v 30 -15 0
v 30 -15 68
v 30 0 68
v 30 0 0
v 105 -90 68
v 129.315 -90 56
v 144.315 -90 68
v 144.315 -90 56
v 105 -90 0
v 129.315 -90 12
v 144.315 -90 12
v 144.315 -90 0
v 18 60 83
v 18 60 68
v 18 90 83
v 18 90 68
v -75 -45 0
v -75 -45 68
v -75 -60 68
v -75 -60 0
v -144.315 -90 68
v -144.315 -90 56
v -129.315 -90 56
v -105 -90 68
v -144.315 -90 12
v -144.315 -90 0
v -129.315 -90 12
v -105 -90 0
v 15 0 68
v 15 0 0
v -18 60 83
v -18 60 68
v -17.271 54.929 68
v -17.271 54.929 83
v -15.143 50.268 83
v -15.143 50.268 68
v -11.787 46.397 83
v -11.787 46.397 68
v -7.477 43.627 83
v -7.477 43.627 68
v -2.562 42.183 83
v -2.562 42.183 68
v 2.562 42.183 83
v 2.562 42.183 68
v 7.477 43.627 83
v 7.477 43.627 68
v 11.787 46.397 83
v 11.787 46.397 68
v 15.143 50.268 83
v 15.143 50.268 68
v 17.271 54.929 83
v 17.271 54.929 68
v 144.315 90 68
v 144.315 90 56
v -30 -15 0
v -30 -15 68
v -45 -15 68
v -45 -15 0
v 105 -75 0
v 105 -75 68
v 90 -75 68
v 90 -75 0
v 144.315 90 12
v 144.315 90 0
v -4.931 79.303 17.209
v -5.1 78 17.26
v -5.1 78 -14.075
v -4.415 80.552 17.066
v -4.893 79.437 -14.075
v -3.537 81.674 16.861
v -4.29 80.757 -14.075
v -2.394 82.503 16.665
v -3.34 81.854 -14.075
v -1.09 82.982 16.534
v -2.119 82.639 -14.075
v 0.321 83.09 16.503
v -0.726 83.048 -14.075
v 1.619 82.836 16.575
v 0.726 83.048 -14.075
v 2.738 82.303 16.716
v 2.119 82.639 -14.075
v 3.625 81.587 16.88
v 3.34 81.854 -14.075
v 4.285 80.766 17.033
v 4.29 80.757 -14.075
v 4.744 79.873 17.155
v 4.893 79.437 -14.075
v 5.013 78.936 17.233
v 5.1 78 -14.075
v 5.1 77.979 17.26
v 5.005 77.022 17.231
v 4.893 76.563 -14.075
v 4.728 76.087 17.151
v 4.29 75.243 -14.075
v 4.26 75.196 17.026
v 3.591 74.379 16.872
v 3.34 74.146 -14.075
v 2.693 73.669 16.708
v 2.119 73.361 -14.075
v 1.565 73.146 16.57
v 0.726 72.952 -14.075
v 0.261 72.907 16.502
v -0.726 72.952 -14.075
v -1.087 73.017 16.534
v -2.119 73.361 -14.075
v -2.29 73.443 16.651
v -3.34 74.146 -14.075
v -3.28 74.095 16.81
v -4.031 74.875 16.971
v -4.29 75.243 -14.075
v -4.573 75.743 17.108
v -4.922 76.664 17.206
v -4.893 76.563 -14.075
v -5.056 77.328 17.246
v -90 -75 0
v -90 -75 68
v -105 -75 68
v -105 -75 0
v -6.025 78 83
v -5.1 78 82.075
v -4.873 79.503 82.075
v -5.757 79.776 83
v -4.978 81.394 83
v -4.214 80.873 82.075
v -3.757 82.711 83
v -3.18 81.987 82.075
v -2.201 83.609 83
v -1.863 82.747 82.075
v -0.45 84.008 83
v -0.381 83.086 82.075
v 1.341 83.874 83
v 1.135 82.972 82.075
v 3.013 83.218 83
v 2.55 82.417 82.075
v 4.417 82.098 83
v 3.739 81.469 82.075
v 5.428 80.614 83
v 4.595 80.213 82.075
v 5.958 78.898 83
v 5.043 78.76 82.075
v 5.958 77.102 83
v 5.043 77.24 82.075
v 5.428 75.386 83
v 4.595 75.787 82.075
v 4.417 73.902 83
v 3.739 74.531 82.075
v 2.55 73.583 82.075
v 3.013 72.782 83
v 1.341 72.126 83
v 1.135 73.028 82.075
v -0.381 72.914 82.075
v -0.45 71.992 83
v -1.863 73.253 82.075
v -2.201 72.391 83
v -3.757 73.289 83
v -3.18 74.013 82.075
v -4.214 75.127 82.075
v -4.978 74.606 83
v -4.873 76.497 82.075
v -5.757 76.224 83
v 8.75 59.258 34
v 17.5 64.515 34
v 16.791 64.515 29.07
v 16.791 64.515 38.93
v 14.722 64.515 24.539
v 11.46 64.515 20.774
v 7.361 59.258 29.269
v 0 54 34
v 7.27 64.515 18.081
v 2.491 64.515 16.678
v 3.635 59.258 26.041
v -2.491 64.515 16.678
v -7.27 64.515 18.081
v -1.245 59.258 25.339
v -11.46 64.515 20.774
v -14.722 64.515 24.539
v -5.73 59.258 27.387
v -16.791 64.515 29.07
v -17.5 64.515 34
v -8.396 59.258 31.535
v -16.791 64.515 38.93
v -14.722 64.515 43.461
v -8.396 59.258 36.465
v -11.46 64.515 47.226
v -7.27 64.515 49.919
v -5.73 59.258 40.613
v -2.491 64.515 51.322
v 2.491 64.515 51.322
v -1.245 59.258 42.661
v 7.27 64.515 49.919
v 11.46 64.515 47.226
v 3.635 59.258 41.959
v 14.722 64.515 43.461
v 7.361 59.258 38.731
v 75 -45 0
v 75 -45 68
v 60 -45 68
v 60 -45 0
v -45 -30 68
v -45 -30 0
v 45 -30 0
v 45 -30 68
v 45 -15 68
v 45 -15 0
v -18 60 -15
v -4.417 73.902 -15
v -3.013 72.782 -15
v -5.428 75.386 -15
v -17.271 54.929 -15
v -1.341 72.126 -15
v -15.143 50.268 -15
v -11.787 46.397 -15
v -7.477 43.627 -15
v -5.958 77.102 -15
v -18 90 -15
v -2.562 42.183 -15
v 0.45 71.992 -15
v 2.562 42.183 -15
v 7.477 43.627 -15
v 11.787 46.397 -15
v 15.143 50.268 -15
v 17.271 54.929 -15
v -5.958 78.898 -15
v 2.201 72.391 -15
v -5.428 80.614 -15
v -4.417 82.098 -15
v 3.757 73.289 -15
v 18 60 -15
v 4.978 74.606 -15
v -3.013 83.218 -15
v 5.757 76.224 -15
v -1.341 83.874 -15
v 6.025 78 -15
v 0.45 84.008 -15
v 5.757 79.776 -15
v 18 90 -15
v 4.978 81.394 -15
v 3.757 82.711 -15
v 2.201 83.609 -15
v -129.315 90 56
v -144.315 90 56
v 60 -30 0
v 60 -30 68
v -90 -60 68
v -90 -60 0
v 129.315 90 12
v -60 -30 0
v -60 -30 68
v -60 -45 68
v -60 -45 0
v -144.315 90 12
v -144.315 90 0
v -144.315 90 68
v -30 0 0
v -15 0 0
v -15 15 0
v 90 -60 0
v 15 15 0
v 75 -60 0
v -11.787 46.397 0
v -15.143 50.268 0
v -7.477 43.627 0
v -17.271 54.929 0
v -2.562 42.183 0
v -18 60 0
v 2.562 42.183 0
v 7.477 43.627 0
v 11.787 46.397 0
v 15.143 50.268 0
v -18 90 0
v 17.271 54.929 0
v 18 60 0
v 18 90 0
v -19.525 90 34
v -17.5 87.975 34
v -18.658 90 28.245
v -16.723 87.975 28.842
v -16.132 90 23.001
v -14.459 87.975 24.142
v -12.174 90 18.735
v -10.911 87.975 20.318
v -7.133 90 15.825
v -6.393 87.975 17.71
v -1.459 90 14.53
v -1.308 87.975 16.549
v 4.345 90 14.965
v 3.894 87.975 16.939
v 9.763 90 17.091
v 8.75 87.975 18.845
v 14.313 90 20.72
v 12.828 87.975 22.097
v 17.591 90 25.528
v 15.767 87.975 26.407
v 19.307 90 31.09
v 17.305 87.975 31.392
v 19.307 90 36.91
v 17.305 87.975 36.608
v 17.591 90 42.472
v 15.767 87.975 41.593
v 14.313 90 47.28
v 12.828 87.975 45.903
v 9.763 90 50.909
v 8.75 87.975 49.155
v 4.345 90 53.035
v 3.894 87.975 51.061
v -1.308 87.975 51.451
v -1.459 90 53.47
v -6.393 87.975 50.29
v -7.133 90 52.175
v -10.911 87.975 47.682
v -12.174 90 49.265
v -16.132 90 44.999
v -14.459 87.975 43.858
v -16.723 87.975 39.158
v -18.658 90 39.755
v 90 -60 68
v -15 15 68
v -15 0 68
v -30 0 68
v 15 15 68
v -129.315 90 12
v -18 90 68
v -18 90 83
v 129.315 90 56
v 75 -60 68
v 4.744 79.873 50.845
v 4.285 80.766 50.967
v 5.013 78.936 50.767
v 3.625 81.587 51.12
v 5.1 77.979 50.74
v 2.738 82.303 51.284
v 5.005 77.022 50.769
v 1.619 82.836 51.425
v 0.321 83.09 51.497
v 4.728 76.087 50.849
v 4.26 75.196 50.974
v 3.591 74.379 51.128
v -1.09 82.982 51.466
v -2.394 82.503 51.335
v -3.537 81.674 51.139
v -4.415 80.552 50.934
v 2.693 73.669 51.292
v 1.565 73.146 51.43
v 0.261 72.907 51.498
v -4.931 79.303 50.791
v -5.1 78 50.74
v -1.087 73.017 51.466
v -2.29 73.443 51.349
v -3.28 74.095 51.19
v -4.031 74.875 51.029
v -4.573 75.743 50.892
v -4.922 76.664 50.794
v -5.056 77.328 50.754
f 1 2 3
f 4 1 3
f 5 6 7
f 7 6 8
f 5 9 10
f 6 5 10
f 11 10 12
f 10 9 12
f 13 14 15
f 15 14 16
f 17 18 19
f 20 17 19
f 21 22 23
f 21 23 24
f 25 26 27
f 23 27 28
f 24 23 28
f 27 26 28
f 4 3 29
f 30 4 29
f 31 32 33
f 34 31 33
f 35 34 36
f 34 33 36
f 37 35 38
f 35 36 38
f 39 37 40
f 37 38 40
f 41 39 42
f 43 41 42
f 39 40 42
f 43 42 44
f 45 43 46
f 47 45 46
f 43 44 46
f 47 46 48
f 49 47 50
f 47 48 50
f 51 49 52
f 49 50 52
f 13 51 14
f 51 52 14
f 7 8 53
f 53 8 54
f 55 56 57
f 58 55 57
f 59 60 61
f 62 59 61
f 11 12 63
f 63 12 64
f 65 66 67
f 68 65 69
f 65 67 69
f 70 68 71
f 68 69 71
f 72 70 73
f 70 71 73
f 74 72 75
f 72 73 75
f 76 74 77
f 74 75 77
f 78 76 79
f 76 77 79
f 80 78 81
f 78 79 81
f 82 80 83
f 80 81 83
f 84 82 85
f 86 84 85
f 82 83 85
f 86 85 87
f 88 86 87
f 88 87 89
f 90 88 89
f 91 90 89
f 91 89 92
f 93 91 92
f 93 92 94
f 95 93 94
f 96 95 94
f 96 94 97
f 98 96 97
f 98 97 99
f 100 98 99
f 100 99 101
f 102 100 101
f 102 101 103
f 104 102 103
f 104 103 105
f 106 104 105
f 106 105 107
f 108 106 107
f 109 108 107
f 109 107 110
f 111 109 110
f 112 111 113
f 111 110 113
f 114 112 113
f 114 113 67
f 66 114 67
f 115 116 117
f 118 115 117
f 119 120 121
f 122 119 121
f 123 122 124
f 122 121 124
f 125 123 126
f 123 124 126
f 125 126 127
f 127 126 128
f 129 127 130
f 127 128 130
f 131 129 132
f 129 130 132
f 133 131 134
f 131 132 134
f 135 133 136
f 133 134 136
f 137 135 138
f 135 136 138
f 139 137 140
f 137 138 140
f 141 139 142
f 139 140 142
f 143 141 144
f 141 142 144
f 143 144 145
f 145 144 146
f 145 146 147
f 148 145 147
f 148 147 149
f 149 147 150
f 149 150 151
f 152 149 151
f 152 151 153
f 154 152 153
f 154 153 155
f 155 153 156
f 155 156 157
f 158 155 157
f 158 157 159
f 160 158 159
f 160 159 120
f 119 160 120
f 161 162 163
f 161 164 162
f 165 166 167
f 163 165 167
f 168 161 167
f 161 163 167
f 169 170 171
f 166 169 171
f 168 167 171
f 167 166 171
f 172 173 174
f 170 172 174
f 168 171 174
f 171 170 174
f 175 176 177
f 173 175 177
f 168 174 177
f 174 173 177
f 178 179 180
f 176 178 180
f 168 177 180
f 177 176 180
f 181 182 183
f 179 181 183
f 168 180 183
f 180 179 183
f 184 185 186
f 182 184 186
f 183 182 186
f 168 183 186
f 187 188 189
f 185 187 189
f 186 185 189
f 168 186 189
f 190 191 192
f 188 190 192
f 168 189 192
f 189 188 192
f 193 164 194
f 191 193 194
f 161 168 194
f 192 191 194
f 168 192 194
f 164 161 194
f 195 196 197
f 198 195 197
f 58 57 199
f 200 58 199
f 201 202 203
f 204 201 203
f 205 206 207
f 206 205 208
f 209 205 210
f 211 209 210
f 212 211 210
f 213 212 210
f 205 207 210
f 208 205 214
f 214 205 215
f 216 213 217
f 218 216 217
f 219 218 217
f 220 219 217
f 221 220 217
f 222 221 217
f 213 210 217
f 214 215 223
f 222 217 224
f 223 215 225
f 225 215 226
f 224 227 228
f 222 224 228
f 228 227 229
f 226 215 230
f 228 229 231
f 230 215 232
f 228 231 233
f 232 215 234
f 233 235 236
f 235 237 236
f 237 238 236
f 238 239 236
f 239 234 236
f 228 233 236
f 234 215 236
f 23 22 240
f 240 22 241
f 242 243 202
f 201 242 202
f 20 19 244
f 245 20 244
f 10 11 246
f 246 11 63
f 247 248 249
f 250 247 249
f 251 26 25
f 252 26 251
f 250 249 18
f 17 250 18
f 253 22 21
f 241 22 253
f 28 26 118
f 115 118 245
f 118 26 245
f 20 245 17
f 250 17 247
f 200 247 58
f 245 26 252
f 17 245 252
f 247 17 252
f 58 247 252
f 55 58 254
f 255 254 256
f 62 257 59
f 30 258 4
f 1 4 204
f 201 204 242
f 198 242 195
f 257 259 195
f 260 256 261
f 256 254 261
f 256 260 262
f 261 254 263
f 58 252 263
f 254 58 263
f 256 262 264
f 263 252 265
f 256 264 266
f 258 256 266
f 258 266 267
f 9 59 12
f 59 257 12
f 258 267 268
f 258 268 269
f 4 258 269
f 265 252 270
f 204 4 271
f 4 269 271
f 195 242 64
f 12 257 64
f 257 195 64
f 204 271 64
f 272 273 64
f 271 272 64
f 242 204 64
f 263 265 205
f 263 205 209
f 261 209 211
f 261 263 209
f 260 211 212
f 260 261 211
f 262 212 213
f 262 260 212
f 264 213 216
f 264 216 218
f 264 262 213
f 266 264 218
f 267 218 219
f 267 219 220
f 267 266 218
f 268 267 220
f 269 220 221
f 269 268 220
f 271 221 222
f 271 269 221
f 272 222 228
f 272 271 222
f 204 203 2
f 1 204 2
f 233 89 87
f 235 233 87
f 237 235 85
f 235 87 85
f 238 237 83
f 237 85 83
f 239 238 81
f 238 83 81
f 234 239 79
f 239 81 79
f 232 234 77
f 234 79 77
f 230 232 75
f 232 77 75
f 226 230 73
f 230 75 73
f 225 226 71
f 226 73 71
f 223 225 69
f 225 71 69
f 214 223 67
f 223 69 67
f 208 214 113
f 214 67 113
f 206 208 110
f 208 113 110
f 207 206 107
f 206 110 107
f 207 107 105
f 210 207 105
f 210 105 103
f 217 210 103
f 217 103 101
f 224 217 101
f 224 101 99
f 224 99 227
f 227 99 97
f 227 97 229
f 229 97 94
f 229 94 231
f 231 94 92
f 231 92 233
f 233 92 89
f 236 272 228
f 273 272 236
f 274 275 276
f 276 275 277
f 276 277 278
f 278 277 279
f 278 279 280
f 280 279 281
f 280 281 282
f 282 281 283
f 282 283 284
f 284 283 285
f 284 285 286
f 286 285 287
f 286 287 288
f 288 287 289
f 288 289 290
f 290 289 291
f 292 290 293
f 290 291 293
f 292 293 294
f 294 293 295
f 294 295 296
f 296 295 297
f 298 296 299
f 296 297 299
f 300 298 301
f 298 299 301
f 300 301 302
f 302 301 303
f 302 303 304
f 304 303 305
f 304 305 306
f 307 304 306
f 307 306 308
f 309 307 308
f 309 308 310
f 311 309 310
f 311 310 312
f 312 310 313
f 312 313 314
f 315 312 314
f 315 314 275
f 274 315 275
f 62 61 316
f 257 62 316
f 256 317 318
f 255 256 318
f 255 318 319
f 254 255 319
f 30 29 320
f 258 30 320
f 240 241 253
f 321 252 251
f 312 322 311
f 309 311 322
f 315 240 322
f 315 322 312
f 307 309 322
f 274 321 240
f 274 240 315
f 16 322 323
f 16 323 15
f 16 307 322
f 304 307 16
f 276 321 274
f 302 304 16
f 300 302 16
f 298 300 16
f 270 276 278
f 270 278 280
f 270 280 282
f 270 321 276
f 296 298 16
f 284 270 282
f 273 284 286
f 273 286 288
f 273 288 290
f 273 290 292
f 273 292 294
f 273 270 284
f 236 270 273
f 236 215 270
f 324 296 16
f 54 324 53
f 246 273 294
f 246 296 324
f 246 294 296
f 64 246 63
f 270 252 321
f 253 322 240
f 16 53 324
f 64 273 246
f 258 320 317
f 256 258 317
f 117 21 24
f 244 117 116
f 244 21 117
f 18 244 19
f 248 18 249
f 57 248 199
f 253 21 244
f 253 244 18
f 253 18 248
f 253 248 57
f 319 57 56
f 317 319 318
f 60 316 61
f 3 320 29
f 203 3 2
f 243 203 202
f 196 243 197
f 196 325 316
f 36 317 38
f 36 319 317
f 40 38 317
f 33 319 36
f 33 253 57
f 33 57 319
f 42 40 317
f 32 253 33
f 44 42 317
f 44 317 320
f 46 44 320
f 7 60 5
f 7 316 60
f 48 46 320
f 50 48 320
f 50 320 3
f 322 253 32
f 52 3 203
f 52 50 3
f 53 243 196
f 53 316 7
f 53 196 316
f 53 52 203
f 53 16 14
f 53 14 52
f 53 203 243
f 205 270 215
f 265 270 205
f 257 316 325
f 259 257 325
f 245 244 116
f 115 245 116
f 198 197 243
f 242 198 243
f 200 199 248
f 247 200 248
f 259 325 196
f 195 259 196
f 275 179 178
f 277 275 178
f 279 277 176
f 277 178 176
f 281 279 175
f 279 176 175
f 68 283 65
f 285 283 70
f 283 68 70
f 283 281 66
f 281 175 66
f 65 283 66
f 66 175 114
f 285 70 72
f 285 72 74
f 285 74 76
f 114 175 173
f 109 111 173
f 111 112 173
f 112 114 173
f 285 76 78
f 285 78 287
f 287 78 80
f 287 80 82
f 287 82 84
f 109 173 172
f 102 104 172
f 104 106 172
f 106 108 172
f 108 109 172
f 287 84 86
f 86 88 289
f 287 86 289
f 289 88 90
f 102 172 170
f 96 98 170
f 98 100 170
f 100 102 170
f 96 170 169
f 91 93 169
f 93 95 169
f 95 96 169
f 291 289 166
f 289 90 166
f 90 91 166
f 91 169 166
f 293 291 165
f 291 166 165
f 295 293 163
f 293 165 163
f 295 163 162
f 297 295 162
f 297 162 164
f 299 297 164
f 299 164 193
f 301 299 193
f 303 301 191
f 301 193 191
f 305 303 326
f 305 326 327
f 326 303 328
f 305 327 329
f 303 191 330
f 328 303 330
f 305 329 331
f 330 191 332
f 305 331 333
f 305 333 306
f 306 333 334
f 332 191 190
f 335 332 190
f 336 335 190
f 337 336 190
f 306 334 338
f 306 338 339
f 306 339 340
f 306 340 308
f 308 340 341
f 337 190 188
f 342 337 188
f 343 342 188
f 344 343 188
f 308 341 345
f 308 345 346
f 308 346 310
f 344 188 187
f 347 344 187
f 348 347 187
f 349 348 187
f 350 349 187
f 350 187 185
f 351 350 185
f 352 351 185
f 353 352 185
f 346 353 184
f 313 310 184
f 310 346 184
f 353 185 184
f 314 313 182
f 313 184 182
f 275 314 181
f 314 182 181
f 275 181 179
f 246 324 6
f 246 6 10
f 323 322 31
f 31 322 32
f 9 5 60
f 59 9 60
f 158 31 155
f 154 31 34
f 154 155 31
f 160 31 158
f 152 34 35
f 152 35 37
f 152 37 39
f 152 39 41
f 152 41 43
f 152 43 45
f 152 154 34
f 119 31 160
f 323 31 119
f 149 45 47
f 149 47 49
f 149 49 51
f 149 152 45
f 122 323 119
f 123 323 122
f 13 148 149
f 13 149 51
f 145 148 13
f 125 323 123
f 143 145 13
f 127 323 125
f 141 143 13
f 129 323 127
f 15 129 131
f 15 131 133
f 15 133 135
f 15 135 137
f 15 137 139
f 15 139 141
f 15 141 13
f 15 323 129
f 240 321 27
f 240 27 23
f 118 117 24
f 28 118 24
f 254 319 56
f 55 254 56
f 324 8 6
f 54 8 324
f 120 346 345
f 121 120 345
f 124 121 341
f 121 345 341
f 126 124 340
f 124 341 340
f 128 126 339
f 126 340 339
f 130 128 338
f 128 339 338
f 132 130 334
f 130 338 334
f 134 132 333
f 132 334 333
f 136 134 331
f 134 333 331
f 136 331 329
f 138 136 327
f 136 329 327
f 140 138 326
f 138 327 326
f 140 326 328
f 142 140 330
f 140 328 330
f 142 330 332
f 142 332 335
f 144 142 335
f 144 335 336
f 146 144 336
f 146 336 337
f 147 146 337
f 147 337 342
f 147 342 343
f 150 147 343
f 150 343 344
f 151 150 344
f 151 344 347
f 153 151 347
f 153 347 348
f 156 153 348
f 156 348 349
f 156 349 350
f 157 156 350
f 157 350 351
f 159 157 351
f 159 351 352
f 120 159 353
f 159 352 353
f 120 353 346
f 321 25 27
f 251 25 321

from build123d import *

# Parameters (mm, degrees)
SKETCH1_W                    = 288.63
SKETCH1_H                    = 180
BOSS_EXTRUDE1_DEPTH          = 68
CUT_EXTRUDE5_DEPTH           = 69
BOSS_EXTRUDE2_DEPTH          = 15
BOSS_EXTRUDE3_DEPTH          = 15
SKETCH9_W                    = 44
SKETCH9_H                    = 180
CUT_EXTRUDE6_DEPTH           = 15
SKETCH10_W                   = 44
SKETCH10_H                   = 180
CUT_EXTRUDE7_DEPTH           = 15
M12_TAPPED_HOLE1_D           = 10.2
M12_TAPPED_HOLE1_DEPTH       = 98
M12_TAPPED_HOLE1_CSINK_D     = 12.05
M12_TAPPED_HOLE1_CSINK_ANGLE = 90
M12_TAPPED_HOLE2_D           = 10.2
M12_TAPPED_HOLE2_DEPTH       = 98
M12_TAPPED_HOLE2_CSINK_D     = 12.05
M12_TAPPED_HOLE2_CSINK_ANGLE = 90
M39_TAPPED_HOLE1_D           = 35
M39_TAPPED_HOLE1_DEPTH       = 25.484939167
M39_TAPPED_HOLE1_CSINK_D     = 39.05
M39_TAPPED_HOLE1_CSINK_ANGLE = 90
M39_TAPPED_HOLE1_TIP         = 10.515060833


with BuildPart() as part:
    # Sketch1 → Boss-Extrude1 (new body)
    with BuildSketch(Plane.XY):
        Rectangle(SKETCH1_W, SKETCH1_H)
    extrude(amount=BOSS_EXTRUDE1_DEPTH)

    # Sketch3 → Cut-Extrude5 (cut, through all)
    with BuildSketch(Plane.XY.offset(68)):
        Polygon((15, 15), (-15, 15), (-15, 0), (-30, 0), (-30, -15), (-45, -15), (-45, -30), (-60, -30), (-60, -45), (-75, -45), (-75, -60), (-90, -60), (-90, -75), (-105, -75), (-105, -90), (105, -90), (105, -75), (90, -75), (90, -60), (75, -60), (75, -45), (60, -45), (60, -30), (45, -30), (45, -15), (30, -15), (30, 0), (15, 0), align=None)
    extrude(amount=-CUT_EXTRUDE5_DEPTH, mode=Mode.SUBTRACT)

    # Sketch7 → Boss-Extrude2 (add)
    with BuildSketch(Plane.XY.offset(68)):
        with BuildLine():
            Line((-18, 90), (-18, 60))
            ThreePointArc((-18, 60), (0, 42), (18, 60))
            Line((18, 60), (18, 90))
            Line((18, 90), (-18, 90))
        make_face()
    extrude(amount=BOSS_EXTRUDE2_DEPTH)

    # Sketch8 → Boss-Extrude3 (add)
    with BuildSketch(Plane(origin=(0, 0, 0), x_dir=(-1, 0, 0), z_dir=(0, 0, -1))):
        with BuildLine():
            Line((-18, 90), (18, 90))
            Line((18, 90), (18, 60))
            ThreePointArc((18, 60), (0, 42), (-18, 60))
            Line((-18, 60), (-18, 90))
        make_face()
    extrude(amount=BOSS_EXTRUDE3_DEPTH)

    # Sketch9 → Cut-Extrude6 (cut)
    with BuildSketch(Plane.ZY.offset(144.315)):
        with Locations((34, 0)):
            Rectangle(SKETCH9_W, SKETCH9_H)
    extrude(amount=-CUT_EXTRUDE6_DEPTH, mode=Mode.SUBTRACT)

    # Sketch10 → Cut-Extrude7 (cut)
    with BuildSketch(Plane(origin=(144.315, 0, 0), x_dir=(0, 0, -1), z_dir=(1, 0, 0))):
        with Locations((-34, 0)):
            Rectangle(SKETCH10_W, SKETCH10_H)
    extrude(amount=-CUT_EXTRUDE7_DEPTH, mode=Mode.SUBTRACT)

    # M12 Tapped Hole1
    with Locations(Plane.XY.offset(83)):
        with Locations((0, 78)):
            CounterSinkHole(M12_TAPPED_HOLE1_D / 2, M12_TAPPED_HOLE1_CSINK_D / 2, depth=M12_TAPPED_HOLE1_DEPTH, counter_sink_angle=M12_TAPPED_HOLE1_CSINK_ANGLE)

    # M12 Tapped Hole2
    with Locations(Plane(origin=(0, 0, -15), x_dir=(-1, 0, 0), z_dir=(0, 0, -1))):
        with Locations((0, 78)):
            CounterSinkHole(M12_TAPPED_HOLE2_D / 2, M12_TAPPED_HOLE2_CSINK_D / 2, depth=M12_TAPPED_HOLE2_DEPTH, counter_sink_angle=M12_TAPPED_HOLE2_CSINK_ANGLE)

    # M39 Tapped Hole1
    with Locations(Plane(origin=(0, 90, 0), x_dir=(1, 0, 0), z_dir=(0, 1, 0))):
        with Locations((0, -34)):
            CounterSinkHole(M39_TAPPED_HOLE1_D / 2, M39_TAPPED_HOLE1_CSINK_D / 2, depth=M39_TAPPED_HOLE1_DEPTH, counter_sink_angle=M39_TAPPED_HOLE1_CSINK_ANGLE)
            with Locations((0, 0, -(M39_TAPPED_HOLE1_DEPTH + M39_TAPPED_HOLE1_TIP / 2))):  # 118° drill point
                Cone(0, M39_TAPPED_HOLE1_D / 2, M39_TAPPED_HOLE1_TIP, mode=Mode.SUBTRACT)


solid = part.part
